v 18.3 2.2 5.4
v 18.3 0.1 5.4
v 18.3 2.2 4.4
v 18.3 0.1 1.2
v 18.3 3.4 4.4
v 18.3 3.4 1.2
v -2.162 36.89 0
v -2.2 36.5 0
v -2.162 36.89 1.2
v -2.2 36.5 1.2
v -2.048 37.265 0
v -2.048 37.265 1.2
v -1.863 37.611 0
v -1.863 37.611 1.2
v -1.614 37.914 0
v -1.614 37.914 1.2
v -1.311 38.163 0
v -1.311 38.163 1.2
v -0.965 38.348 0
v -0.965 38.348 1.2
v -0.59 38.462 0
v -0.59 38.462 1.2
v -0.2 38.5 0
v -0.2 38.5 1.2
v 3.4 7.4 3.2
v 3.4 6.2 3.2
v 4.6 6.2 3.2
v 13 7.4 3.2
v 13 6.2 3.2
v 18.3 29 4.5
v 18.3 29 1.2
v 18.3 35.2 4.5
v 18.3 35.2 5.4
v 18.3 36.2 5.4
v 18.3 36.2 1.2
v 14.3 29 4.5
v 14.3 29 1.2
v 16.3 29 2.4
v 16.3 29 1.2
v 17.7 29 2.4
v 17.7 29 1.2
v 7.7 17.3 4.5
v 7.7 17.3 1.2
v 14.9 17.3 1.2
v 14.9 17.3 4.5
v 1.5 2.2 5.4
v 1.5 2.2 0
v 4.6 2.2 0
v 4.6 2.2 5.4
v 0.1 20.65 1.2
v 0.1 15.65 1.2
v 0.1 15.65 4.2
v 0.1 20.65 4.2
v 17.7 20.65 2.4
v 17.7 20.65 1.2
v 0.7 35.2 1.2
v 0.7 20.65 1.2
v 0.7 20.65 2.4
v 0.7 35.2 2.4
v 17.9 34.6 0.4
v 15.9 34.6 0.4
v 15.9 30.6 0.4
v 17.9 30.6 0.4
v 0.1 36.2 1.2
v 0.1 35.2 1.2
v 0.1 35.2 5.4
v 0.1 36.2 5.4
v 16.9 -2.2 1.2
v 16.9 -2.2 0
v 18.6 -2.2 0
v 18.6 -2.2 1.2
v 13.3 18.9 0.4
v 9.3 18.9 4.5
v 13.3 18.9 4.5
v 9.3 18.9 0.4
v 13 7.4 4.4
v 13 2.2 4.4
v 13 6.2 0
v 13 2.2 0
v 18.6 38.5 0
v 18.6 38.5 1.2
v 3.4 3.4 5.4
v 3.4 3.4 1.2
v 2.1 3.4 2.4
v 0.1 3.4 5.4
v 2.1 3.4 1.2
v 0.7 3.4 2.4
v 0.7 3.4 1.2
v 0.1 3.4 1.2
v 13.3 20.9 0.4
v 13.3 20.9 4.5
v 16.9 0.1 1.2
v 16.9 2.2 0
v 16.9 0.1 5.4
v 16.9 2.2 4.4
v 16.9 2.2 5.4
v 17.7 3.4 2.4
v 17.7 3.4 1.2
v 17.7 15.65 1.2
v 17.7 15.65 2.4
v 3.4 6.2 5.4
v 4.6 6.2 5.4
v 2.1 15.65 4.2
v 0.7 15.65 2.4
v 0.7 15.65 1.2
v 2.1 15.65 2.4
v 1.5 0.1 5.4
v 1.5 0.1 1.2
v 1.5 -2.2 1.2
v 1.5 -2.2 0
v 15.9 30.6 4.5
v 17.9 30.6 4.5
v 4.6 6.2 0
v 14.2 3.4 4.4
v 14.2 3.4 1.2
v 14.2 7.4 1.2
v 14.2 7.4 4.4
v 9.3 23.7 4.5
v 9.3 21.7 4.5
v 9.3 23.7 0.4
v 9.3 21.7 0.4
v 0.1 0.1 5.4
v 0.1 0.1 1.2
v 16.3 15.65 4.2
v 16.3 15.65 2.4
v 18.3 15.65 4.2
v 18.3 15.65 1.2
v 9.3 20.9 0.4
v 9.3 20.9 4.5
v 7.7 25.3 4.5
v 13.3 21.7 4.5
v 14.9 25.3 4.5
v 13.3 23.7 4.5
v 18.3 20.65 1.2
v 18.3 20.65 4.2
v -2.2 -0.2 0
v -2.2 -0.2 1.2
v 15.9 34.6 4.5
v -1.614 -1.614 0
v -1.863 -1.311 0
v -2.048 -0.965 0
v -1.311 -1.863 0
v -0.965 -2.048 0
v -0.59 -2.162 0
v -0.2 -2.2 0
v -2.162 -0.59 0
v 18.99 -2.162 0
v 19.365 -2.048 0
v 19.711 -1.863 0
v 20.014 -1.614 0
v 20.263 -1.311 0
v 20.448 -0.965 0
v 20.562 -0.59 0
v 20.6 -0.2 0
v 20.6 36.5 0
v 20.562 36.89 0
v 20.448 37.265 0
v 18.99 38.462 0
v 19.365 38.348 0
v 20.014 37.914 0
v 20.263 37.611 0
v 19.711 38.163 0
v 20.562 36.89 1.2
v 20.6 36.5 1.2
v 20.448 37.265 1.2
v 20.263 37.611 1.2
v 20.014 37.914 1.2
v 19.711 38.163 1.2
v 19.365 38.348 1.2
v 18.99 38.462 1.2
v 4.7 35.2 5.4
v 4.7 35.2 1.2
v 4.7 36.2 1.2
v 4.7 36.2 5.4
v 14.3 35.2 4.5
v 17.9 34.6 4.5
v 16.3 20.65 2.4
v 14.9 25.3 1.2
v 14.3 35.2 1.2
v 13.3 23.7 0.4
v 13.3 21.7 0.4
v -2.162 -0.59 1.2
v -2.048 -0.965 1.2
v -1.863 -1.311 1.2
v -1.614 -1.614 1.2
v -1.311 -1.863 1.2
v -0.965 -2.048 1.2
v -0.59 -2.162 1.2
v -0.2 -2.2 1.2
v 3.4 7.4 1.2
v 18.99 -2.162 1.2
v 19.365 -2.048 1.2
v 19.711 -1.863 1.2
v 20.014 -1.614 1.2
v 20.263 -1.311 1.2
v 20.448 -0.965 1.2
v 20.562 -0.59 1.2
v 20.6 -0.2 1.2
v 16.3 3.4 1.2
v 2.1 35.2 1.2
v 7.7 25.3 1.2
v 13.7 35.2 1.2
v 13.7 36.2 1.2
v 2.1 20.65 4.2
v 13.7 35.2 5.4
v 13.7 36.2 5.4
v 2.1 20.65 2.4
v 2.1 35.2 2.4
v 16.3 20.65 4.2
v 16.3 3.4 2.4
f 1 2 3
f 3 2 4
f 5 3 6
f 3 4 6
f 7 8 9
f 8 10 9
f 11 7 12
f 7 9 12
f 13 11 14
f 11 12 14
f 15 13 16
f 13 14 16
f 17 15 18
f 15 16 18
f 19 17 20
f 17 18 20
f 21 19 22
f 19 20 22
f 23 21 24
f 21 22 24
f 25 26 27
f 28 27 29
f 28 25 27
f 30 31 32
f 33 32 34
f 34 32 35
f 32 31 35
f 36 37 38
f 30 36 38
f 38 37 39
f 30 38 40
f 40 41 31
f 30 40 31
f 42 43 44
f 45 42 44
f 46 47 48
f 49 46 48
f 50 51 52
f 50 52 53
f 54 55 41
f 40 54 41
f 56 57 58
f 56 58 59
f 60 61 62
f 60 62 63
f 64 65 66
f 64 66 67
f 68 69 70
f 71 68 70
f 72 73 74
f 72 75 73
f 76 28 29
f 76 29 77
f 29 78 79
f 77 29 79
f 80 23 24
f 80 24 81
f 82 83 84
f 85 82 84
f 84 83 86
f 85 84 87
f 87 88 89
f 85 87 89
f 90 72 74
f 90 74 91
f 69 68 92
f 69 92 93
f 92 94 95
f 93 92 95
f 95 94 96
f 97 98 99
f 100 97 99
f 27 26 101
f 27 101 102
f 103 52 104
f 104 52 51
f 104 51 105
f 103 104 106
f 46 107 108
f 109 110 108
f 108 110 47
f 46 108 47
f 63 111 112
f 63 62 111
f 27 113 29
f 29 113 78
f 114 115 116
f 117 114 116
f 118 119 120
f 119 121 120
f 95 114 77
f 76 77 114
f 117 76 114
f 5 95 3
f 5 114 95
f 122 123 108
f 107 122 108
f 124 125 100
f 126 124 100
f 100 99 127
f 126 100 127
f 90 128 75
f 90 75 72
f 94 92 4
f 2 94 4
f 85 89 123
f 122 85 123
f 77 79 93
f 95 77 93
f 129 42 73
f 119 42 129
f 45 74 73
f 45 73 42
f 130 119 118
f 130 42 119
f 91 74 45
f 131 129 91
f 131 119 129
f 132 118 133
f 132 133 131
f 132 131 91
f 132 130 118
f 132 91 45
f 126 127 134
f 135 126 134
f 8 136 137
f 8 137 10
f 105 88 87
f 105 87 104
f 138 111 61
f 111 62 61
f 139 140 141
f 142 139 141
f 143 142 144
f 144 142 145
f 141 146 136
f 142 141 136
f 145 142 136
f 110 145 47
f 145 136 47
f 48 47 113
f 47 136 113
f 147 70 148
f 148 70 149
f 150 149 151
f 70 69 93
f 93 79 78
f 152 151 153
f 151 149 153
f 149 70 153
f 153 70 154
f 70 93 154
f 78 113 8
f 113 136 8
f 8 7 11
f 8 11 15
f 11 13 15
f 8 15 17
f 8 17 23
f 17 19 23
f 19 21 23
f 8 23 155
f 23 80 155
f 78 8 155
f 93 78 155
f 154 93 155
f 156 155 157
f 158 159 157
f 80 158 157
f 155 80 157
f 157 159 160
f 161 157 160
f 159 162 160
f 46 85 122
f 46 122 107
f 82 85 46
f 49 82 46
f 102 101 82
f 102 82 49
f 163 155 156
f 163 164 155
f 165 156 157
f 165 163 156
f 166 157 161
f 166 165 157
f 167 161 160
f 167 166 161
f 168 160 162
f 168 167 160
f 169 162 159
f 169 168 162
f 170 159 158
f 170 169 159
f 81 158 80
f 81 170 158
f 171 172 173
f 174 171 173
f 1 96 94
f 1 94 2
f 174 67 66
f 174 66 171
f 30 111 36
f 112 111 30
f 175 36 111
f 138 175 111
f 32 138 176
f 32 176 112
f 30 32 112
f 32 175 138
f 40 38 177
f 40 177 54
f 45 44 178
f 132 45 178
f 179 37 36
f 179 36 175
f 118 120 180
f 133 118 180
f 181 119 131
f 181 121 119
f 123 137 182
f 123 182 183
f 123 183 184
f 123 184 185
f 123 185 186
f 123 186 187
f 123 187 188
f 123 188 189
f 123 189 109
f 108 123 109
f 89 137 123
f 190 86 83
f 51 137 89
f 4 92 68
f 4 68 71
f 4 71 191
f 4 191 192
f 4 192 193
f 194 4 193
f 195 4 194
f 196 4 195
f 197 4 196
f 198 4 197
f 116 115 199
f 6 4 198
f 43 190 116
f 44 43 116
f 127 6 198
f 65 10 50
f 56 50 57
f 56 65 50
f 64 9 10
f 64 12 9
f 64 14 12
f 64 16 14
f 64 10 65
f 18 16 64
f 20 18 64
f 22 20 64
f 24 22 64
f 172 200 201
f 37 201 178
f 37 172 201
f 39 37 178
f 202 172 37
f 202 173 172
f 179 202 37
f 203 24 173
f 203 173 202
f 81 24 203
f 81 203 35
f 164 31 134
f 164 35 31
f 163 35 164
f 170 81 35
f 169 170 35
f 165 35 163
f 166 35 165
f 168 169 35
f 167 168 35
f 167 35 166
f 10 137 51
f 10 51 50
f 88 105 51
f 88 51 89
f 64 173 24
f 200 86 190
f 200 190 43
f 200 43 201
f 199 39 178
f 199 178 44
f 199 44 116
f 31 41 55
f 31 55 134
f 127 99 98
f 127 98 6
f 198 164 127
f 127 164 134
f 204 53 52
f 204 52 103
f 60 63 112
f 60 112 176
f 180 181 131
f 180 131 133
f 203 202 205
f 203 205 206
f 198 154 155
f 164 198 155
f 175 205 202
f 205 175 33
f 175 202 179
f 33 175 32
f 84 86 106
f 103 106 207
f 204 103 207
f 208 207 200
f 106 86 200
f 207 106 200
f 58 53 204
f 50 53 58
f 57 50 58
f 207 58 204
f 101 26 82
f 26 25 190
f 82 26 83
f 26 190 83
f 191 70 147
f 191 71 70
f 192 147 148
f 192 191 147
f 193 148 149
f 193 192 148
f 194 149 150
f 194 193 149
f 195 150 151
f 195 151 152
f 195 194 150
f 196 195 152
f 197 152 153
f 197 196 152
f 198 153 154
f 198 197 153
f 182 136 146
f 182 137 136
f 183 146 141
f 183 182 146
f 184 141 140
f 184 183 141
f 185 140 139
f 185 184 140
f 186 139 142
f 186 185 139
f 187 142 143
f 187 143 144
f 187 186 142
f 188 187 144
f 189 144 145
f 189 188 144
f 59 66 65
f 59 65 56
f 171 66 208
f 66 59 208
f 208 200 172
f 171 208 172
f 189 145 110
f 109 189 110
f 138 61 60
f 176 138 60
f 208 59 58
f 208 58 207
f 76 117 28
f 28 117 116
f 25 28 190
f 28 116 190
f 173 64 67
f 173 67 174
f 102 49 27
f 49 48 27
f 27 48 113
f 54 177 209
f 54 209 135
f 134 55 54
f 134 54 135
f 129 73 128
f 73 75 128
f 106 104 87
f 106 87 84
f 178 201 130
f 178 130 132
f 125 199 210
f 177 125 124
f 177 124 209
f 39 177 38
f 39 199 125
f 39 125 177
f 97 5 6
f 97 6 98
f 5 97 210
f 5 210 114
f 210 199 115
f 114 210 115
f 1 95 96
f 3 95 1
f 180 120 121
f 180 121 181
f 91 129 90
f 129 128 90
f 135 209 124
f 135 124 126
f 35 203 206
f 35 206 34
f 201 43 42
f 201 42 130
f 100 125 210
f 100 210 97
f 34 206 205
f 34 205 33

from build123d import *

# Parameters (mm, degrees)
SKETCH1_W                      = 22.8
SKETCH1_H                      = 40.7
BOSS_EXTRUDE1_DEPTH            = 1.2
FILLET1_R                      = 2
CUT_EXTRUDE1_REACH             = 45.681
SKETCH4_W                      = 15.4
SKETCH4_H                      = 4.4
CUT_EXTRUDE1_DIRECTION_2_DEPTH = 44.681231668
CUT_EXTRUDE2_REACH             = 45.681
SKETCH5_W                      = 8.4
SKETCH5_H                      = 4
SKETCH6_W                      = 4.6
SKETCH6_H                      = 1
SKETCH6_W_2                    = 1.4
SKETCH6_H_2                    = 2.1
BOSS_EXTRUDE3_DEPTH            = 4.2
SKETCH7_W                      = 1.2
SKETCH7_H                      = 2.8
BOSS_EXTRUDE4_DEPTH            = 4.2
BOSS_EXTRUDE5_DEPTH            = 2
BOSS_EXTRUDE6_DEPTH            = 1.2
SKETCH10_W                     = 2
SKETCH10_H                     = 4
SKETCH10_W_2                   = 4
SKETCH10_H_2                   = 2
CUT_EXTRUDE3_DEPTH             = 0.8
SKETCH11_W                     = 7.2
SKETCH11_H                     = 8
SKETCH11_W_2                   = 4
SKETCH11_H_2                   = 2
SKETCH11_H_3                   = 6.2
SKETCH11_W_3                   = 2
SKETCH11_H_4                   = 4
BOSS_EXTRUDE7_DEPTH            = 3.3
SKETCH12_W                     = 2
SKETCH12_H                     = 5
BOSS_EXTRUDE8_DEPTH            = 3
SKETCH13_W                     = 1.4
SKETCH13_H                     = 14.55
SKETCH13_H_2                   = 8.35
SKETCH13_H_3                   = 12.25
BOSS_EXTRUDE9_DEPTH            = 1.2


with BuildPart() as part:
    # Sketch1 → Boss-Extrude1 (new body)
    with BuildSketch(Plane.XY):
        with Locations((9.2, 18.15)):
            Rectangle(SKETCH1_W, SKETCH1_H)
    extrude(amount=BOSS_EXTRUDE1_DEPTH)

    # Fillet1
    fillet1_edges = [part.edges().sort_by_distance(p)[0] for p in [
        (-2.2, 38.5, 0.6),
        (20.6, 38.5, 0.6),
        (20.6, -2.2, 0.6),
        (-2.2, -2.2, 0.6),
    ]]
    fillet(fillet1_edges, radius=FILLET1_R)

    # Sketch4 → Cut-Extrude1 (cut, up to next)
    with BuildSketch(Plane.XY.offset(1.2), mode=Mode.PRIVATE) as cut_extrude1_sk1:
        with Locations((9.2, 0)):
            Rectangle(SKETCH4_W, SKETCH4_H)
    cut_extrude1_tool1 = extrude(cut_extrude1_sk1.sketch, amount=-CUT_EXTRUDE1_REACH, mode=Mode.PRIVATE) & part.part
    add(cut_extrude1_tool1.solids().sort_by_distance((9.2, 0, 1.2))[0], mode=Mode.SUBTRACT)

    # Sketch4 → Cut-Extrude1 direction 2 (cut)
    with BuildSketch(Plane.XY.offset(1.2)):
        with Locations((9.2, 0)):
            Rectangle(SKETCH4_W, SKETCH4_H)
    extrude(amount=CUT_EXTRUDE1_DIRECTION_2_DEPTH, mode=Mode.SUBTRACT)

    # Sketch5 → Cut-Extrude2 (cut, up to next)
    with BuildSketch(Plane.XY.offset(1.2), mode=Mode.PRIVATE) as cut_extrude2_sk1:
        with Locations((8.8, 4.2)):
            Rectangle(SKETCH5_W, SKETCH5_H)
    cut_extrude2_tool1 = extrude(cut_extrude2_sk1.sketch, amount=-CUT_EXTRUDE2_REACH, mode=Mode.PRIVATE) & part.part
    add(cut_extrude2_tool1.solids().sort_by_distance((8.8, 4.2, 1.2))[0], mode=Mode.SUBTRACT)

    # Sketch6 → Boss-Extrude3 (add)
    with BuildSketch(Plane.XY.offset(1.2)):
        with Locations((16, 35.7)):
            Rectangle(SKETCH6_W, SKETCH6_H)
        with Locations((2.4, 35.7)):
            Rectangle(SKETCH6_W, SKETCH6_H)
        with Locations((0.8, 1.15)):
            Rectangle(SKETCH6_W_2, SKETCH6_H_2)
        with Locations((17.6, 1.15)):
            Rectangle(SKETCH6_W_2, SKETCH6_H_2)
    extrude(amount=BOSS_EXTRUDE3_DEPTH)

    # Sketch7 → Boss-Extrude4 (add)
    with BuildSketch(Plane.XY.offset(1.2)):
        Polygon((0.1, 3.4), (0.1, 2.2), (1.5, 2.2), (4.6, 2.2), (4.6, 3.4), (3.4, 3.4), align=None)
        with Locations((4, 4.8)):
            Rectangle(SKETCH7_W, SKETCH7_H)
    extrude(amount=BOSS_EXTRUDE4_DEPTH)

    # Sketch8 → Boss-Extrude5 (add)
    with BuildSketch(Plane.XY.offset(1.2)):
        Polygon((4.6, 6.2), (13, 6.2), (13, 7.4), (3.4, 7.4), (3.4, 6.2), align=None)
        Polygon((13, 3.4), (14.2, 3.4), (14.2, 7.4), (13, 7.4), (13, 6.2), align=None)
        Polygon((16.9, 2.2), (18.3, 2.2), (18.3, 3.4), (14.2, 3.4), (13, 3.4), (13, 2.2), align=None)
    extrude(amount=BOSS_EXTRUDE5_DEPTH)

    # Sketch9 → Boss-Extrude6 (add)
    with BuildSketch(Plane.XY.offset(3.2)):
        Polygon((13, 7.4), (13, 6.2), (13, 2.2), (16.9, 2.2), (18.3, 2.2), (18.3, 3.4), (14.2, 3.4), (14.2, 7.4), align=None)
    extrude(amount=BOSS_EXTRUDE6_DEPTH)

    # Sketch10 → Cut-Extrude3 (cut)
    with BuildSketch(Plane.XY.offset(1.2)):
        with Locations((16.9, 32.6)):
            Rectangle(SKETCH10_W, SKETCH10_H)
        with Locations((11.3, 22.7)):
            Rectangle(SKETCH10_W_2, SKETCH10_H_2)
        with Locations((11.3, 19.9)):
            Rectangle(SKETCH10_W_2, SKETCH10_H_2)
    extrude(amount=-CUT_EXTRUDE3_DEPTH, mode=Mode.SUBTRACT)

    # Sketch11 → Boss-Extrude7 (add)
    # profile 1 of 2: a face of its own
    with BuildSketch(Plane.XY.offset(1.2)):
        with Locations((11.3, 21.3)):
            Rectangle(SKETCH11_W, SKETCH11_H)
        with Locations((11.3, 19.9)):
            Rectangle(SKETCH11_W_2, SKETCH11_H_2, mode=Mode.SUBTRACT)
        with Locations((11.3, 22.7)):
            Rectangle(SKETCH11_W_2, SKETCH11_H_2, mode=Mode.SUBTRACT)
    # profile 2 of 2: a face of its own
    with BuildSketch(Plane.XY.offset(1.2)):
        with Locations((16.3, 32.1)):
            Rectangle(SKETCH11_W_2, SKETCH11_H_3)
        with Locations((16.9, 32.6)):
            Rectangle(SKETCH11_W_3, SKETCH11_H_4, mode=Mode.SUBTRACT)
    extrude(amount=BOSS_EXTRUDE7_DEPTH)

    # Sketch12 → Boss-Extrude8 (add)
    with BuildSketch(Plane.XY.offset(1.2)):
        with Locations((1.1, 18.15)):
            Rectangle(SKETCH12_W, SKETCH12_H)
        with Locations((17.3, 18.15)):
            Rectangle(SKETCH12_W, SKETCH12_H)
    extrude(amount=BOSS_EXTRUDE8_DEPTH)

    # Sketch13 → Boss-Extrude9 (add)
    with BuildSketch(Plane.XY.offset(1.2)):
        with Locations((1.4, 27.925)):
            Rectangle(SKETCH13_W, SKETCH13_H)
        with Locations((17, 24.825)):
            Rectangle(SKETCH13_W, SKETCH13_H_2)
        with Locations((17, 9.525)):
            Rectangle(SKETCH13_W, SKETCH13_H_3)
        with Locations((1.4, 9.525)):
            Rectangle(SKETCH13_W, SKETCH13_H_3)
    extrude(amount=BOSS_EXTRUDE9_DEPTH)


solid = part.part
